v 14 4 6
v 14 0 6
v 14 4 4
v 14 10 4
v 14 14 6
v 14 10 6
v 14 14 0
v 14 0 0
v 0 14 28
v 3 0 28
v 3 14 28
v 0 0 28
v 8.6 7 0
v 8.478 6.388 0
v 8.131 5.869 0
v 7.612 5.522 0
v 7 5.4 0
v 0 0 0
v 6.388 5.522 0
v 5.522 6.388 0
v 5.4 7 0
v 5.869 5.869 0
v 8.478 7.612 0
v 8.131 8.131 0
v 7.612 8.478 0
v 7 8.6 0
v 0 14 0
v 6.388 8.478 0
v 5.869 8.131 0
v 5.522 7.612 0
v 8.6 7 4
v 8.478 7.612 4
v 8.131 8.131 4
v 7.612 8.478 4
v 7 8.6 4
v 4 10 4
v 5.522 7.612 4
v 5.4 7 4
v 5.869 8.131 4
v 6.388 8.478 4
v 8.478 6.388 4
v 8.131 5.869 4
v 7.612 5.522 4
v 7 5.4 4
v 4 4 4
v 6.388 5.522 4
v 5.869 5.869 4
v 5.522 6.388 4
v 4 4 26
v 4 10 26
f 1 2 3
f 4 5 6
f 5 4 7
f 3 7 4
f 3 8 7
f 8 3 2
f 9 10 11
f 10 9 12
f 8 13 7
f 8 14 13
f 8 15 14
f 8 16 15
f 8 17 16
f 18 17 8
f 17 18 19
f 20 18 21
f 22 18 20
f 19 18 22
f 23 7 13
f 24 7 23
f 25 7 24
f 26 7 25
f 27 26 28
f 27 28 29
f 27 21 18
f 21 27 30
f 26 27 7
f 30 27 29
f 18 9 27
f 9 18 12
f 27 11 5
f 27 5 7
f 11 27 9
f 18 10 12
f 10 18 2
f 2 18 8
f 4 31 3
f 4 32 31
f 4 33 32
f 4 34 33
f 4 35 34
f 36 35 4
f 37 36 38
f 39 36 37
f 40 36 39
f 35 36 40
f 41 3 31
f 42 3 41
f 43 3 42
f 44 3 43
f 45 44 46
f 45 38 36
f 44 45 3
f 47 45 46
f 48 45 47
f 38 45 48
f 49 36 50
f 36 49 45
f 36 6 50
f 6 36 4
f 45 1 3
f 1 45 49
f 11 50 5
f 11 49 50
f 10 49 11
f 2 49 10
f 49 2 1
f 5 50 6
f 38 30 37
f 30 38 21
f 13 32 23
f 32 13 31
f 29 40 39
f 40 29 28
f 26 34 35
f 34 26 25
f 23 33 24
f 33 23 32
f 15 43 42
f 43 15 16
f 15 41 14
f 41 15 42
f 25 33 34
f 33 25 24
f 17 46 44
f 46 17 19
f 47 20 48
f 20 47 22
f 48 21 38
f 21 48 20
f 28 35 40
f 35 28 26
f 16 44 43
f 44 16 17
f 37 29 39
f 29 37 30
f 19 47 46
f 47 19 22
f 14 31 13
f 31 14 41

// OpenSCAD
/*
Aluminum Extrusion 90 Degree corner bracket
Parametric
Author: BinaryConstruct
*/

/* [Basic] */

// length
size_x = 1; // [1:4]

// width
size_y = 1; // [1:4]

// height
size_z = 2; // [1:4]

// include holes in vertical side
vertical_holes = 0; // [0:1]

// include extra diagonals
incremental_supports = 1; // [0:1]

// include alignment studs
alignment_studs = 0; // [0:1]

// slot holes
slot_holes = 0; // [0:1]

// screw hole diameter
hole_d = 3.2;


/* [Advanced] */
// thickness of base plates
plate_thickness = 4; // [2:4]

// thickenss of angled support
side_thickenss = 4; // [2:4]

// size of extrusion increment (20mm)
base_size = 14;

// size of alignement stud
alignment_stud_diameter = 5; 
alignment_stud_height = 1;
slot_length = 3;

difference()
{
    union(){
        difference(){
            cube([size_x * base_size,size_y * base_size,size_z * base_size]);
            
            // hollow cut
            translate([plate_thickness,side_thickenss,plate_thickness]) {
                cube([size_x * base_size, (size_y * base_size) - (side_thickenss * 2),base_size * size_z]);
            }
        }
        
        if (incremental_supports == 1) {
            for (y=[base_size : base_size : (size_y-1) * base_size])
                translate([0,y-side_thickenss/2,z])
                cube([size_x * base_size,side_thickenss,size_z * base_size]);
        }
        
        if (alignment_studs == 1) {
            // vertical holes
            for(z=[base_size / 2 : base_size : (size_z * base_size) - (base_size / 2)])
            for(y=[base_size / 2 : base_size : (size_y * base_size) - (base_size / 2)])
            {
                translate([0,y,z-alignment_stud_diameter]) 
                rotate([0,90,0]) 
                translate([0,0,-alignment_stud_height]) 
                { cylinder($fn=16, r=alignment_stud_diameter/2,h=alignment_stud_height); }
                
                translate([0,y,z+alignment_stud_diameter]) 
                rotate([0,90,0]) 
                translate([0,0,-alignment_stud_height]) 
                { cylinder($fn=16, r=alignment_stud_diameter/2,h=alignment_stud_height); }
            }
        }
    }
    
    // diagonal cut   
    translate([plate_thickness/2,size_y * base_size+1,plate_thickness/2])
    rotate([90,0,0])
        linear_extrude(size_y * base_size+2) {
            polygon([
                [size_x * base_size,0], 
                [size_x * base_size,size_z * base_size],
                [0,size_z * base_size]]);
        }
      
    // bottom holes
    for(x=[base_size / 2  : base_size : (size_x * base_size) - (base_size / 2)])
    for(y=[base_size / 2  : base_size : (size_y * base_size) - (base_size / 2)])
    {
        
        translate([x,y,-plate_thickness/2])
        union()
        { 
            cylinder($fn=16, r=hole_d/2,h=plate_thickness*2); 
            if (slot_holes == 1) {
                
                translate([0,-hole_d/2,0])
                cube([slot_length,hole_d,plate_thickness*2]);
                
                translate([slot_length,0,0])
                cylinder($fn=16, r=hole_d/2,h=plate_thickness*2); 
            }
        }
    }

    // vertical holes
    if (vertical_holes == 1) {
        for(z=[base_size / 2 : base_size : (size_z * base_size) - (base_size / 2)])
        for(y=[base_size / 2 : base_size : (size_y * base_size) - (base_size / 2)])
        {
            translate([0,y,z]) 
            rotate([0,90,0]) 
            translate([0,0,-plate_thickness/2]) 
            { cylinder($fn=16, r=hole_d/2,h=plate_thickness*2); }
        }
    }

}
